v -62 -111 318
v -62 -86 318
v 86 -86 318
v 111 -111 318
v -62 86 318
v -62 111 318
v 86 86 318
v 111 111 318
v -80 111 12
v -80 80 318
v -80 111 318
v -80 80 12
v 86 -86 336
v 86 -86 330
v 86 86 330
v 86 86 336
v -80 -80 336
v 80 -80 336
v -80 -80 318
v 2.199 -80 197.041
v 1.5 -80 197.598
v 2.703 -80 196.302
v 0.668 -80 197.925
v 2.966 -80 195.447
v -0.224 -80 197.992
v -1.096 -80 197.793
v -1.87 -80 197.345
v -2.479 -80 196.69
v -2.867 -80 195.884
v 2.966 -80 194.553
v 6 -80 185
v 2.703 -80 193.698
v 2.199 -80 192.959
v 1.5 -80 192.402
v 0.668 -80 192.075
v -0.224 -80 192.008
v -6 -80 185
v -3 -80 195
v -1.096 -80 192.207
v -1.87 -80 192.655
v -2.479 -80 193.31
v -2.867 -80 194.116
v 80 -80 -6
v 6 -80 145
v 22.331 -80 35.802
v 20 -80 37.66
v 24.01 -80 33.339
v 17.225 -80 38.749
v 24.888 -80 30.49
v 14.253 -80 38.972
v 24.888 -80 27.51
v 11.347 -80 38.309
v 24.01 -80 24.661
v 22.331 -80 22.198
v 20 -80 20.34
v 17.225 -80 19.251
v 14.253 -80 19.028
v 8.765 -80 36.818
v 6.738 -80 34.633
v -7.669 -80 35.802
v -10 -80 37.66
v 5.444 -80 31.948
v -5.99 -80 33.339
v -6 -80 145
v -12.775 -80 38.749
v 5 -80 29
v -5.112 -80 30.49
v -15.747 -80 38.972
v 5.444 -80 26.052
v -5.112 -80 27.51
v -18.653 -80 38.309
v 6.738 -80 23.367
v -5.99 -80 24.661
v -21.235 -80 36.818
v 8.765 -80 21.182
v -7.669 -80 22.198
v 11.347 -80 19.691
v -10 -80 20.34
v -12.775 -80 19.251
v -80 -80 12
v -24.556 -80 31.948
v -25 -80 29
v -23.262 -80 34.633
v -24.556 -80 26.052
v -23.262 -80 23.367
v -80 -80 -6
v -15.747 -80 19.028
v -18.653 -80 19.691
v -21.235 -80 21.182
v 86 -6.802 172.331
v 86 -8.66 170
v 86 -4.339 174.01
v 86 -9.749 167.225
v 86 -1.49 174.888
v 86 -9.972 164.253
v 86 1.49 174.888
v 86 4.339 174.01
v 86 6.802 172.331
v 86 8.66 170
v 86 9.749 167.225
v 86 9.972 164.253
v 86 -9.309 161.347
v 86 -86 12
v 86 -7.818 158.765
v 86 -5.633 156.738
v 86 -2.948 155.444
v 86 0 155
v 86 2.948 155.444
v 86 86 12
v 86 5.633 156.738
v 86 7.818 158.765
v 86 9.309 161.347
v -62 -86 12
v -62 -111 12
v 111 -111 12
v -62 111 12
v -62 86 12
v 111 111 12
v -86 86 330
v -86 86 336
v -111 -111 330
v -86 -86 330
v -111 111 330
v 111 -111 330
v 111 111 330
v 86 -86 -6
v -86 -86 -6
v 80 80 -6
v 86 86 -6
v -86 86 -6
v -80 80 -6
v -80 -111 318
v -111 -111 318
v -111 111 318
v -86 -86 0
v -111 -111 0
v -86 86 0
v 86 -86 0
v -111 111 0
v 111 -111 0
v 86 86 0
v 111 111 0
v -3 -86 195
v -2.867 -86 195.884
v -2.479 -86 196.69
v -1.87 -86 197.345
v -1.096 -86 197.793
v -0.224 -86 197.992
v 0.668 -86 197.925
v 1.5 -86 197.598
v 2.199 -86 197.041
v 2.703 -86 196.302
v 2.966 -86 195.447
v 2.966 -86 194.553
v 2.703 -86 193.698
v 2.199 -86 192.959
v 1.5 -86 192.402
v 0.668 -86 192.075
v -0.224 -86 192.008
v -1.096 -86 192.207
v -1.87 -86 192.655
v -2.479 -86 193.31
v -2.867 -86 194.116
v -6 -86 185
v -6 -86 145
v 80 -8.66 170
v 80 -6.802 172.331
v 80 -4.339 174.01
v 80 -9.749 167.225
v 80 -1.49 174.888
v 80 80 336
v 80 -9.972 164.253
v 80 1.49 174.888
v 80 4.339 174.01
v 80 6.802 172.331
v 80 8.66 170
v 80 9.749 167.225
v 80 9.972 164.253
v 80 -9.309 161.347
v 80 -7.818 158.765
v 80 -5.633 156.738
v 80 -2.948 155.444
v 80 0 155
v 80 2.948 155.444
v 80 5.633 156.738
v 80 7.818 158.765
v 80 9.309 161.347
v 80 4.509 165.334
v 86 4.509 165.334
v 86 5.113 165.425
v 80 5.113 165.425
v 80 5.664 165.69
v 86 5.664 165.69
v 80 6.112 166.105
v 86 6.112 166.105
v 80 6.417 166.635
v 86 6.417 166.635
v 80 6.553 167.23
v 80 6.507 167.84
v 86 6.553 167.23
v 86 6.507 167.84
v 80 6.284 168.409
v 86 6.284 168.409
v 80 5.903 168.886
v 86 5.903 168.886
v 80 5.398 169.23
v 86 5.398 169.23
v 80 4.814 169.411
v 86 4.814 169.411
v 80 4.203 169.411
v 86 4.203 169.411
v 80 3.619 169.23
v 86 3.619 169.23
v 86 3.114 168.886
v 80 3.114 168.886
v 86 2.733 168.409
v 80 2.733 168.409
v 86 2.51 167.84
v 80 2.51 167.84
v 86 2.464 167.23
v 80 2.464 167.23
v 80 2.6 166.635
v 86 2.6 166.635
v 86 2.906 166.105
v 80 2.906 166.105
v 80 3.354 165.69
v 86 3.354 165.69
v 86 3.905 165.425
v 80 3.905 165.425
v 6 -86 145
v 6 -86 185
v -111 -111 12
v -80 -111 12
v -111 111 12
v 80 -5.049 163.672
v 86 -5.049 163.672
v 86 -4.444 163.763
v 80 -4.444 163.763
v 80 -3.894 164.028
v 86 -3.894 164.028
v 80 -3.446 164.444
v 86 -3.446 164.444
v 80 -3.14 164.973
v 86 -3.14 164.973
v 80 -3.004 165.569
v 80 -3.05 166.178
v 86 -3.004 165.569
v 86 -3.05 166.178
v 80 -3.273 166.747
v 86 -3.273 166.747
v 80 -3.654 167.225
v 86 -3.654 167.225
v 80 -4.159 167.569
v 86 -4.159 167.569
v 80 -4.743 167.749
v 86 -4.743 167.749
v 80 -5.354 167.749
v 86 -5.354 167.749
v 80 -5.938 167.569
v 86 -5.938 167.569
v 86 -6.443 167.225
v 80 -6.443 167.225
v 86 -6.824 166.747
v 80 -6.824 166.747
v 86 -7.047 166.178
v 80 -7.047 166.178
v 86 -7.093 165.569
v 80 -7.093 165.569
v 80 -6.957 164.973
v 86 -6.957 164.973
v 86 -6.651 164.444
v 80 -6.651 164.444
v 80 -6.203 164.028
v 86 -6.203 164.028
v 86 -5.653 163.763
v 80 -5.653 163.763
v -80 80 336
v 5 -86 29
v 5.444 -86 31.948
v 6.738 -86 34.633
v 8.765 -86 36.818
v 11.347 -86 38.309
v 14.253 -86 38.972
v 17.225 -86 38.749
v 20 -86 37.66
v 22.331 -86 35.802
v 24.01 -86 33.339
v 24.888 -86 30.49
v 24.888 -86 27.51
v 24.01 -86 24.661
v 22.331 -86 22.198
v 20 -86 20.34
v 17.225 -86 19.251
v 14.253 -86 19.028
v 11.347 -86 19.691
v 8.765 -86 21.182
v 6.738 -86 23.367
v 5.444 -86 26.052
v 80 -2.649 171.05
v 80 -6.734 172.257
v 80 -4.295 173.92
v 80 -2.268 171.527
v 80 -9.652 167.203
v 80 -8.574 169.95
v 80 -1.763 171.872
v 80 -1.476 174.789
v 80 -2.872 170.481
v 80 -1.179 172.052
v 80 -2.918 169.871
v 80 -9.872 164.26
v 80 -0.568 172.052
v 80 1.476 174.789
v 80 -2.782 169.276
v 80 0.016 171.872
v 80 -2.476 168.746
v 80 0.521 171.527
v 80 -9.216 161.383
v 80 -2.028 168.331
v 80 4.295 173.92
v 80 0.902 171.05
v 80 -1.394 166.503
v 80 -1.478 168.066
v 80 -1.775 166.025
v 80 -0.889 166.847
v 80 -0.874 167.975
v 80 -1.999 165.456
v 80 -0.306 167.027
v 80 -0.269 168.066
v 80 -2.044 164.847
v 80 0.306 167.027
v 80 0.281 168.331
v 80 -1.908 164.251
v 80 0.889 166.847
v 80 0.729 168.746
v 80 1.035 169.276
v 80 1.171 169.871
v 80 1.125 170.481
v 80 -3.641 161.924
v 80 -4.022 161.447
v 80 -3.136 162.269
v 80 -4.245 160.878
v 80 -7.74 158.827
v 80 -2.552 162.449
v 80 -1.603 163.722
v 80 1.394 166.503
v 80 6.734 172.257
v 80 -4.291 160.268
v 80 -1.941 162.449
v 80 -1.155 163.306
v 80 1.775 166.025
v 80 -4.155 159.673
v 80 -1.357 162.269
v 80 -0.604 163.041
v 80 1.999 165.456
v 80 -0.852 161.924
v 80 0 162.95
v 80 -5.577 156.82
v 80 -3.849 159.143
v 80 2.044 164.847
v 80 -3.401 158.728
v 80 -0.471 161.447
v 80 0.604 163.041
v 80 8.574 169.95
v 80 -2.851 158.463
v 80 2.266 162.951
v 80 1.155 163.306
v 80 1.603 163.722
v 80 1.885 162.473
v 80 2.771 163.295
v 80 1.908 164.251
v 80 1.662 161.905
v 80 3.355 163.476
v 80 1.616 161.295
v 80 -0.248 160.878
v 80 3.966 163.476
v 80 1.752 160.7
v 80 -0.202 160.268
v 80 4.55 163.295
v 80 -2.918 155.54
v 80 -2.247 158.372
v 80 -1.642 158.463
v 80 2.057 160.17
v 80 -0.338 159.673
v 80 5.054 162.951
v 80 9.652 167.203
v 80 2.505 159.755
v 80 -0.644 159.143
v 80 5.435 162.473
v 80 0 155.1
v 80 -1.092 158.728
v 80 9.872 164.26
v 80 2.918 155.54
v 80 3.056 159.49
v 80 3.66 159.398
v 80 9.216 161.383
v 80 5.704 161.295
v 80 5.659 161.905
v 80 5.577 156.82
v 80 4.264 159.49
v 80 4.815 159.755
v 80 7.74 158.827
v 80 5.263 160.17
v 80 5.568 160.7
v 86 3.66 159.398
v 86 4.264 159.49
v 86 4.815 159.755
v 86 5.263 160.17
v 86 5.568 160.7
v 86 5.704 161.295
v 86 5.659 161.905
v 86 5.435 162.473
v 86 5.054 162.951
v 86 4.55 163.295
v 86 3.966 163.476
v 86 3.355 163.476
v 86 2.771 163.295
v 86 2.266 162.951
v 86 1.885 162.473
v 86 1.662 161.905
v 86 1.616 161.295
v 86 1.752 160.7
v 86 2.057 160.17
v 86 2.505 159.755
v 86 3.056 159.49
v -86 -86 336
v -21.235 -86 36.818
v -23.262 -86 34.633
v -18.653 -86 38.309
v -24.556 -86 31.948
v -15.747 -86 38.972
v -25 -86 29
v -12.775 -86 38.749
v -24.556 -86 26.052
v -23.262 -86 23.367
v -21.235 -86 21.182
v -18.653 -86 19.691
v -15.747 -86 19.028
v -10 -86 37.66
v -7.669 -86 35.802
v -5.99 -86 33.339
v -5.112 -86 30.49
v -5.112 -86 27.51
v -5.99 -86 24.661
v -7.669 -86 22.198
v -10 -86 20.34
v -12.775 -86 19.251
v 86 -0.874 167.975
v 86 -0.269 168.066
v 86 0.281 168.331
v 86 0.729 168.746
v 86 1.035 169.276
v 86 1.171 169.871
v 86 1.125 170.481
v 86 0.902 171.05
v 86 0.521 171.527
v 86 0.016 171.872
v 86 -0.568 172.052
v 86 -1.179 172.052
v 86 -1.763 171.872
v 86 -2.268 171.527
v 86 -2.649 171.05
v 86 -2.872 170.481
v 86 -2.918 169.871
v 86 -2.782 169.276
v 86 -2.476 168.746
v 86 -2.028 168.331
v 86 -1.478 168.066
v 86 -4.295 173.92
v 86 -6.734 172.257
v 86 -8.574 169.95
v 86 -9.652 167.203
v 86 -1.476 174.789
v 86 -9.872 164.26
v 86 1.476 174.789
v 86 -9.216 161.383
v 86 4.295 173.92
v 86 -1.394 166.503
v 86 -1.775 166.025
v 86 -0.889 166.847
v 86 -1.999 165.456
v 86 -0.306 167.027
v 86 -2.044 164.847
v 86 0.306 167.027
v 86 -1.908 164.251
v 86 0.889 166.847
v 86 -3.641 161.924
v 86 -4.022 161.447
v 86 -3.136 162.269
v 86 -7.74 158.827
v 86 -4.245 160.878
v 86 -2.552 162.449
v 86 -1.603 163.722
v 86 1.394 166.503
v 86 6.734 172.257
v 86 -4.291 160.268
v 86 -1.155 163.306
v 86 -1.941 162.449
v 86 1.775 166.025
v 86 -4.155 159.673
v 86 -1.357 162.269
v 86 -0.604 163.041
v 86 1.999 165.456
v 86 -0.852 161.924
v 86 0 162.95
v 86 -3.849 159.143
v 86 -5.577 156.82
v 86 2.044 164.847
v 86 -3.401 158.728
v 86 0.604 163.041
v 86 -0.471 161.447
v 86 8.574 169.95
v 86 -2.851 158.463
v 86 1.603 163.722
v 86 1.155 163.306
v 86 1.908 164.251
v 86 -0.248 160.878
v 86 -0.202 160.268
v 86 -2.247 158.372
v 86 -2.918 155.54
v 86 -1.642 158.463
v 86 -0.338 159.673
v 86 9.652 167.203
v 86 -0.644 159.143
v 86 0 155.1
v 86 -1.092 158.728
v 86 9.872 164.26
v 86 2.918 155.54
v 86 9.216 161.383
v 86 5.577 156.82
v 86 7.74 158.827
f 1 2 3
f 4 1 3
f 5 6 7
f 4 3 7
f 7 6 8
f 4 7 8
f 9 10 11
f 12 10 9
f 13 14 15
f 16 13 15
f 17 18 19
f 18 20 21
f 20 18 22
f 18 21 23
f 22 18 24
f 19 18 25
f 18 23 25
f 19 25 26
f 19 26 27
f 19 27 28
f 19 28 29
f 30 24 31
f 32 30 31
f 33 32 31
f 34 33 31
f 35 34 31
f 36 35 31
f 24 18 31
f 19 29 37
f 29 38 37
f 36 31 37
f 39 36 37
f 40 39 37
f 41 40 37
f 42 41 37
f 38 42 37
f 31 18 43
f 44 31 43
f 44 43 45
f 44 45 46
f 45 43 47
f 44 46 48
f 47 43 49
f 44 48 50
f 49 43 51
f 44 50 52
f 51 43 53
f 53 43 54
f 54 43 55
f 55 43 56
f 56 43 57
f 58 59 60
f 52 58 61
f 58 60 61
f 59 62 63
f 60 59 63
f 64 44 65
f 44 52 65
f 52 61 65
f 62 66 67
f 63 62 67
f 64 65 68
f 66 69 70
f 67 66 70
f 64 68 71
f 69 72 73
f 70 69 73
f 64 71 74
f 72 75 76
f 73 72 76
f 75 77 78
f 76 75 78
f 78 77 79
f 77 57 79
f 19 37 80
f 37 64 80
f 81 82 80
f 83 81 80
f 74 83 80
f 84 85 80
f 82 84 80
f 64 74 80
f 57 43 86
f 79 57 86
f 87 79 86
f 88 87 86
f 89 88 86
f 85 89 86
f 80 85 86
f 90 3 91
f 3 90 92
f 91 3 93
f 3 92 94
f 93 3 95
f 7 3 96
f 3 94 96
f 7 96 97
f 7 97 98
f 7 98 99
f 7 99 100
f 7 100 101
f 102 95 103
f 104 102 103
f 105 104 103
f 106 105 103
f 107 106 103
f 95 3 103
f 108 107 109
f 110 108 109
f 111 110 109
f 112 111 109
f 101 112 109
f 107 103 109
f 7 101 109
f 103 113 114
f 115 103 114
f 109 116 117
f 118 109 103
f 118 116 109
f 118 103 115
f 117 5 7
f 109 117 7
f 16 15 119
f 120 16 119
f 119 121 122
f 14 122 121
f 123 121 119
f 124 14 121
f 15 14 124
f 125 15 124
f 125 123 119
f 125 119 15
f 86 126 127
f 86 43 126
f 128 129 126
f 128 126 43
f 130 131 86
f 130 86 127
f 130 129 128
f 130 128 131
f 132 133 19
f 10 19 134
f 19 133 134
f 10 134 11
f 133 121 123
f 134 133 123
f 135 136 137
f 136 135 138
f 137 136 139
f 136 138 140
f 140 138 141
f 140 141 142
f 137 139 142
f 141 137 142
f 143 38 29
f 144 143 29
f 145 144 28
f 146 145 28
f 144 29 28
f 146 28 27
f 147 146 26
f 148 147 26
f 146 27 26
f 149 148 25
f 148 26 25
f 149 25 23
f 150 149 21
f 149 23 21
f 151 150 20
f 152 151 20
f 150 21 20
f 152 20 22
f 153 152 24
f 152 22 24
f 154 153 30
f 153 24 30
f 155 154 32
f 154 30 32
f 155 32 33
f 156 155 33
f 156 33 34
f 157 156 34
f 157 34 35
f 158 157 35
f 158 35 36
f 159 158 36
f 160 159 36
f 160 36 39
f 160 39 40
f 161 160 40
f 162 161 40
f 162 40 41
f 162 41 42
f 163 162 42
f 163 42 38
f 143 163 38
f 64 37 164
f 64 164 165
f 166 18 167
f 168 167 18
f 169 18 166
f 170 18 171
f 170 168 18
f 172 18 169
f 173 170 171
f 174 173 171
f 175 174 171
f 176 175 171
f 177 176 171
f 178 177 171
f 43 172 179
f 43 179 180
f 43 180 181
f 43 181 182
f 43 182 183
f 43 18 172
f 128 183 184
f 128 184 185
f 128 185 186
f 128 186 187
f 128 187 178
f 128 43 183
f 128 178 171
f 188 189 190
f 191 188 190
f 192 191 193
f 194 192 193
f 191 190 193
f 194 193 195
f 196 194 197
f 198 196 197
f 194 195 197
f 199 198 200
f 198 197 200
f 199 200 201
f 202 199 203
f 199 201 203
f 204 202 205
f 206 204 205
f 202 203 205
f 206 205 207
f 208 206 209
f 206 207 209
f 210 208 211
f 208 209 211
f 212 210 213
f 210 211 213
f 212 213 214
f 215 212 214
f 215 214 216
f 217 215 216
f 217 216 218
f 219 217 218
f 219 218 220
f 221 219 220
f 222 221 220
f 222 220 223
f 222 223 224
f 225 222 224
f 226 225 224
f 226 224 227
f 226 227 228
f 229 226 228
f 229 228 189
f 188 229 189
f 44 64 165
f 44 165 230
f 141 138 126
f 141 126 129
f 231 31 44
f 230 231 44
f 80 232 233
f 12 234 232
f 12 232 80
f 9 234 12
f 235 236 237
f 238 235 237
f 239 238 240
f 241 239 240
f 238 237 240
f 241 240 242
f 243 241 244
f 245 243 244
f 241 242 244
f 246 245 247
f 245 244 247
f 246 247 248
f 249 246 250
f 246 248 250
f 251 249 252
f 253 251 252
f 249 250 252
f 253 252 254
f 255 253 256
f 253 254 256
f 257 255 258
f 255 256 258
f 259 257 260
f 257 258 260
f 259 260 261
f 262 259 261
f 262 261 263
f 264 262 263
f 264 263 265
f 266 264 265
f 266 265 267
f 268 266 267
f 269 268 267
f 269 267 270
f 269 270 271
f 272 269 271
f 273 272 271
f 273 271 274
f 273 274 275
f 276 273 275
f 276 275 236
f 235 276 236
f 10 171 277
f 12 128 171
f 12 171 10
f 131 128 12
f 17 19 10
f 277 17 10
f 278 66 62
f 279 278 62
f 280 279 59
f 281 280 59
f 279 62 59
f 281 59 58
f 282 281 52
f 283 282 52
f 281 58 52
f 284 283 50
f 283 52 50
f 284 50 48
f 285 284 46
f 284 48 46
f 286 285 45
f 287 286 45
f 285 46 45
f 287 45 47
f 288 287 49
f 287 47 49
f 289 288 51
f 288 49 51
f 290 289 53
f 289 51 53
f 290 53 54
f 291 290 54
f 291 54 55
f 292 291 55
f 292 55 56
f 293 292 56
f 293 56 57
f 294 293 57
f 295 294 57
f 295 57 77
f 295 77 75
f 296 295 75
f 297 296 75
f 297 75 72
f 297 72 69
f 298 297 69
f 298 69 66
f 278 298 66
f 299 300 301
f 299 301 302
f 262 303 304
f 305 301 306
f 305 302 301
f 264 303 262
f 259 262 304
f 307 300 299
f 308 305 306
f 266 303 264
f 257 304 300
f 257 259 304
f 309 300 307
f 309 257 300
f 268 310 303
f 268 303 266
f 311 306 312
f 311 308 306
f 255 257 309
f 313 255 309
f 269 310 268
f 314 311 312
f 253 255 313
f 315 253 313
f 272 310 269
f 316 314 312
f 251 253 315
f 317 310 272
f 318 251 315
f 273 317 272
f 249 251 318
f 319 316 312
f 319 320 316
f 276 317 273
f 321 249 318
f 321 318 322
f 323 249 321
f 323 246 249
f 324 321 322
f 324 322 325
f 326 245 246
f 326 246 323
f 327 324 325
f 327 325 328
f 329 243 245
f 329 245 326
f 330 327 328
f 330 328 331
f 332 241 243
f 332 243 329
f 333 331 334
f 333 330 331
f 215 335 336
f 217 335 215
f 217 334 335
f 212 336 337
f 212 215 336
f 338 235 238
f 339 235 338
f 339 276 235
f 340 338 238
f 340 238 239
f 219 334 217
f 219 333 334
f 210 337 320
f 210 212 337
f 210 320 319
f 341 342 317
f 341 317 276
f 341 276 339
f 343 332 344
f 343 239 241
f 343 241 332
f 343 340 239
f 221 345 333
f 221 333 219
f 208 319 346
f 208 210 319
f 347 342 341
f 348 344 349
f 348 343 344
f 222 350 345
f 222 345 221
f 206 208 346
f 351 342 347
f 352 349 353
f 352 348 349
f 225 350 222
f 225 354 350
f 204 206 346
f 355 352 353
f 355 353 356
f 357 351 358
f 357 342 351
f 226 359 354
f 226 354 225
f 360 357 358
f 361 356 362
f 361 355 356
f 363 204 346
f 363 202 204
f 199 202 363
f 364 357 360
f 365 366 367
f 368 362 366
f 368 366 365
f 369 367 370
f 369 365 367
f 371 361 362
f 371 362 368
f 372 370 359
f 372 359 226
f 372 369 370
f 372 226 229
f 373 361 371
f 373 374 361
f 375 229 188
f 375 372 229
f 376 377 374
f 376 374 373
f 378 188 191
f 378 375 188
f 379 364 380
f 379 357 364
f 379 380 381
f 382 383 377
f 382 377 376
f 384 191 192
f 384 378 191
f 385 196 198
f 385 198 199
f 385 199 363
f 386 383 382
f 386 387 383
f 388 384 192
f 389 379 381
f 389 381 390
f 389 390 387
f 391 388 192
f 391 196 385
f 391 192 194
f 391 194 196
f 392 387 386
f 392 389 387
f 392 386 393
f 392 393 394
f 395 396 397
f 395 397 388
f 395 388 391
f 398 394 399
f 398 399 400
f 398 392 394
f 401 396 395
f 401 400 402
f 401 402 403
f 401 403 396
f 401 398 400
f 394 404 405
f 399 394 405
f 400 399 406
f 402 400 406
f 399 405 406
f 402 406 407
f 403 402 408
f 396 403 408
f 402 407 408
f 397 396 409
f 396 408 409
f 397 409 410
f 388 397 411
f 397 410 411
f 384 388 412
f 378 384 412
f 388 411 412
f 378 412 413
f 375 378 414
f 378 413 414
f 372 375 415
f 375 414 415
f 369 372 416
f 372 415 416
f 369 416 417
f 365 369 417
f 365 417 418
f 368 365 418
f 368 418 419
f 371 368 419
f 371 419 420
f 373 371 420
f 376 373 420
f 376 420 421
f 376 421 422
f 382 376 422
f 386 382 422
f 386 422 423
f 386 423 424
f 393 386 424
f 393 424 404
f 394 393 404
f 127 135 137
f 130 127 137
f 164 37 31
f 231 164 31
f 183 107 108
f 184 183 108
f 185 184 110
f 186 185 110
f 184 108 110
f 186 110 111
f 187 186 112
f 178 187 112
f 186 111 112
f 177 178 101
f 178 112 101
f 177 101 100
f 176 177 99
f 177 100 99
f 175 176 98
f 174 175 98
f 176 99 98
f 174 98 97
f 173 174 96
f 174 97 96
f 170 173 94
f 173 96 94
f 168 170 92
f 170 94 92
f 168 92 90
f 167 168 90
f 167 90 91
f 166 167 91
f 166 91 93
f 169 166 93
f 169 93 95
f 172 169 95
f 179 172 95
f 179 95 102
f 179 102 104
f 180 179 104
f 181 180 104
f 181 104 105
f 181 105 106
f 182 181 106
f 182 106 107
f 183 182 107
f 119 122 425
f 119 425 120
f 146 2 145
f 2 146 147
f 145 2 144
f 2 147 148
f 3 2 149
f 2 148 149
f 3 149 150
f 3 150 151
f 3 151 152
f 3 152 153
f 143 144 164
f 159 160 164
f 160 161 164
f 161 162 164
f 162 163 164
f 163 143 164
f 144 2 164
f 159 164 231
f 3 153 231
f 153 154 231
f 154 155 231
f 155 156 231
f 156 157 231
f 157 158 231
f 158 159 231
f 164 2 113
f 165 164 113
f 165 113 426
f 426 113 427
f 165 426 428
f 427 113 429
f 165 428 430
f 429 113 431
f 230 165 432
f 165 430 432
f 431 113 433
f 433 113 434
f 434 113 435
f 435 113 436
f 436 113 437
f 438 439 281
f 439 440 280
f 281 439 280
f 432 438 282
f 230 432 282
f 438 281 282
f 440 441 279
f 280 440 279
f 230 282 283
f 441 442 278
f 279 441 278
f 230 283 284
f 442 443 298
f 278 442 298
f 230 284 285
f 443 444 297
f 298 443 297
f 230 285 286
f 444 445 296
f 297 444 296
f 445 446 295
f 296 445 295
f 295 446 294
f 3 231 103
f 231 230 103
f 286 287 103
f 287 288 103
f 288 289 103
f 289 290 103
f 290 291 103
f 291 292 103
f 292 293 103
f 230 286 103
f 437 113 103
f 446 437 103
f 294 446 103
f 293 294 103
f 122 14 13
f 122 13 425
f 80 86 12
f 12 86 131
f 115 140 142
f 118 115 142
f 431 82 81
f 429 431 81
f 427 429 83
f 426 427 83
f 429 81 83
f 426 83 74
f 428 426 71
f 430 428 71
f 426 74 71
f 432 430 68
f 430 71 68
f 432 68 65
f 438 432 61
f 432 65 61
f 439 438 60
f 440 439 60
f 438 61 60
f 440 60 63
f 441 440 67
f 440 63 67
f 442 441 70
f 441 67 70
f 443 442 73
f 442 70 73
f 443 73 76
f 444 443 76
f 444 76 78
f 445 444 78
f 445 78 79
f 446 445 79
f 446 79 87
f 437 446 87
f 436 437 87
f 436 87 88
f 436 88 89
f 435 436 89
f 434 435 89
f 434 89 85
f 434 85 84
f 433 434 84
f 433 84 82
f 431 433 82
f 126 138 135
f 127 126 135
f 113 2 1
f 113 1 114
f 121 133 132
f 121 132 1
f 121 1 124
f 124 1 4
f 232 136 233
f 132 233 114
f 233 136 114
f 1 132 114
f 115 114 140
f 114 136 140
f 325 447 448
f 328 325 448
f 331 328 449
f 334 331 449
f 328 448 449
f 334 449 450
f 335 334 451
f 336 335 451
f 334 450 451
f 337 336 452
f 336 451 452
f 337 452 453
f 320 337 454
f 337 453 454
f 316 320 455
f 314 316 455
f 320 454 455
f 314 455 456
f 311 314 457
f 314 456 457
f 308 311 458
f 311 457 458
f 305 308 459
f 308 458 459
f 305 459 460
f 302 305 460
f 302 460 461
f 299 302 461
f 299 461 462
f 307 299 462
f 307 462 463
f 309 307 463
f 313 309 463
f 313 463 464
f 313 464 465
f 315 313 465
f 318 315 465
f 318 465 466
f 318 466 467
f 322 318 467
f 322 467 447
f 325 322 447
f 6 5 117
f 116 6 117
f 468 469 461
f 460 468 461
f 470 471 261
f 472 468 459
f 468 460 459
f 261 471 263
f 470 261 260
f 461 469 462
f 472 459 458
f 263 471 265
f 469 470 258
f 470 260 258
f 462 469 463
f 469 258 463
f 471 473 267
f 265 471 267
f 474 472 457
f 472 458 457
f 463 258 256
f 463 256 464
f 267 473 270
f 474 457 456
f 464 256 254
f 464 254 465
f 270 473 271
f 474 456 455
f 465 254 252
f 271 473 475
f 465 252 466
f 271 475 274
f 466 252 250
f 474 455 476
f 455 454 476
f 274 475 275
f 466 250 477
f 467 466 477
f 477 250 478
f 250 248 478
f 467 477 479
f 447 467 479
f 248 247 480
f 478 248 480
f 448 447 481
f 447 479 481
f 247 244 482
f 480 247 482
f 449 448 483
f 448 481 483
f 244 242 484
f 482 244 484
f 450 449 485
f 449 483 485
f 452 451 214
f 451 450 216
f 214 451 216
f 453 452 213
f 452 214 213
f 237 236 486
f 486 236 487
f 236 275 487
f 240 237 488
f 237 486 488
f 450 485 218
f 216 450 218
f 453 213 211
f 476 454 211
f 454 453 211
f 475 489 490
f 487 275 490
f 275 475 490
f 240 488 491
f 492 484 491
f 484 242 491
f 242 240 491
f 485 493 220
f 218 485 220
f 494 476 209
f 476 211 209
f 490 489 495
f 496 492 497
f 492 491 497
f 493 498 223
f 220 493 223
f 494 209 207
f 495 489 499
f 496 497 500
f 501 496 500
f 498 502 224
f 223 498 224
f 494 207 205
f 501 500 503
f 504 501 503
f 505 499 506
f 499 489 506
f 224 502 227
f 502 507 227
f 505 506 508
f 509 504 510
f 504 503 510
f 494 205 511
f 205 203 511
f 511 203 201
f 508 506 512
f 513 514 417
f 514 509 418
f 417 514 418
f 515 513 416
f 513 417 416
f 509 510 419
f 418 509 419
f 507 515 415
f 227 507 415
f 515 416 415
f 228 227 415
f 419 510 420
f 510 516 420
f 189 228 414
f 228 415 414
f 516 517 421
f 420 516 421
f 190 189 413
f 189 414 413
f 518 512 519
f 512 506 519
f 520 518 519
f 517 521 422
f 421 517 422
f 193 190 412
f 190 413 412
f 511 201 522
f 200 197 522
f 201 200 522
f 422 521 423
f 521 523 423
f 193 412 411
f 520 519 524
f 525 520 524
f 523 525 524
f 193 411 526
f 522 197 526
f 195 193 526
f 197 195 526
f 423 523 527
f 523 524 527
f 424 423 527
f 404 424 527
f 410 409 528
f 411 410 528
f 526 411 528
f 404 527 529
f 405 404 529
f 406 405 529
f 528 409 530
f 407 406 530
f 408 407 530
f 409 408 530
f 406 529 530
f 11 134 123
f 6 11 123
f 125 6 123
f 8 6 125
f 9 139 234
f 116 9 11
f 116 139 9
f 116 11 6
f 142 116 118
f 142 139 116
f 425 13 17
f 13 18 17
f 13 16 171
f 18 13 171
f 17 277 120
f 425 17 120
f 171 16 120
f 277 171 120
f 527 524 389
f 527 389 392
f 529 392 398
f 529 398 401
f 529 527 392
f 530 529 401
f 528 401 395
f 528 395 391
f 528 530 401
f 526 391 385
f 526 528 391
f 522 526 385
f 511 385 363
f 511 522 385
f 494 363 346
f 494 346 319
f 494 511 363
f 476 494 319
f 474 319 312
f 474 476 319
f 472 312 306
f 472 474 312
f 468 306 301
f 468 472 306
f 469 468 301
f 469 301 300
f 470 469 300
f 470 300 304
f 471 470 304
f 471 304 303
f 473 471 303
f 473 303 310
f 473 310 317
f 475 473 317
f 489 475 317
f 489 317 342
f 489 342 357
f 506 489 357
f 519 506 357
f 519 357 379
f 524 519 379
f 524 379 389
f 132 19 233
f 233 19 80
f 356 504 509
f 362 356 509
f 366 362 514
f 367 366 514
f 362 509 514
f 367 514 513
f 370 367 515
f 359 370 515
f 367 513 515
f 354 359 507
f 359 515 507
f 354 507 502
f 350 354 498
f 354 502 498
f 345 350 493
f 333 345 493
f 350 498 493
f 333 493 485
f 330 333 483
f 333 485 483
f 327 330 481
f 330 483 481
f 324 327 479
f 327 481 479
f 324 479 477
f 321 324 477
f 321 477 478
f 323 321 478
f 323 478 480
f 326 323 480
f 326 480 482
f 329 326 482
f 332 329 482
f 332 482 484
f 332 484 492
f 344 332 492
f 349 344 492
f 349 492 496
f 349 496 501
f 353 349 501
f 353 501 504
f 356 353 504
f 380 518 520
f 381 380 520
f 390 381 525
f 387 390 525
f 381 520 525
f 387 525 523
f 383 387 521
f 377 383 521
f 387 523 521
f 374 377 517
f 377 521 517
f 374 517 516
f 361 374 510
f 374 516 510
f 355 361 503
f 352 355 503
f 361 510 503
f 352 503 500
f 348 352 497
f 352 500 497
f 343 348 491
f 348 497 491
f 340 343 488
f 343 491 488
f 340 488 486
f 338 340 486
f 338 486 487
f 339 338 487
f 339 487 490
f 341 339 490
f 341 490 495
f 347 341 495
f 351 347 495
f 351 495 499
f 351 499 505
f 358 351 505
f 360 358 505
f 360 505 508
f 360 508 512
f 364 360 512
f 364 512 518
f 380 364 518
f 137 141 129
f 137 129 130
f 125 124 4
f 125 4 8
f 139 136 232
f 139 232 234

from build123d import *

# Parameters (mm, degrees)
SKETCH1_W           = 172
SKETCH1_H           = 172
SKETCH1_W_2         = 160
SKETCH1_H_2         = 160
EXTRUDE_THIN1_DEPTH = 330
SKETCH5_W           = 222
SKETCH5_H           = 222
SKETCH5_W_2         = 160
SKETCH5_H_2         = 160
BOSS_EXTRUDE2_DEPTH = 12
SKETCH6_W           = 172
SKETCH6_H           = 172
SKETCH6_W_2         = 160
SKETCH6_H_2         = 160
EXTRUDE_THIN2_DEPTH = 6
SKETCH7_W           = 6
SKETCH7_H           = 306
CUT_EXTRUDE1_DEPTH  = 406.001234566
SKETCH8_W           = 18
SKETCH8_H           = 306
BOSS_EXTRUDE3_DEPTH = 25
SKETCH10_R          = 10
SKETCH10_R_2        = 9.9
SKETCH10_R_3        = 2.05
CUT_EXTRUDE2_DEPTH  = 406.001234566
SKETCH11_R          = 10
SKETCH11_R_2        = 3
SKETCH11_W          = 12
SKETCH11_H          = 40
CUT_EXTRUDE3_DEPTH  = 79


with BuildPart() as part:
    # Sketch1 → Extrude-Thin1 (new body)
    with BuildSketch(Plane.XY):
        Rectangle(SKETCH1_W, SKETCH1_H)
        Rectangle(SKETCH1_W_2, SKETCH1_H_2, mode=Mode.SUBTRACT)
    extrude(amount=EXTRUDE_THIN1_DEPTH)

    # Sketch5 → Boss-Extrude2 (add)
    with BuildSketch(Plane.XY.offset(330)):
        Rectangle(SKETCH5_W, SKETCH5_H)
        Rectangle(SKETCH5_W_2, SKETCH5_H_2, mode=Mode.SUBTRACT)
    boss_extrude2 = extrude(amount=-BOSS_EXTRUDE2_DEPTH)

    # Mirror2: Boss-Extrude2 across plane
    add(boss_extrude2.mirror(Plane.XY.offset(165)))

    # Sketch6 → Extrude-Thin2 (add)
    with BuildSketch(Plane(origin=(0, 0, 0), x_dir=(-1, 0, 0), z_dir=(0, 0, -1))):
        Rectangle(SKETCH6_W, SKETCH6_H)
        Rectangle(SKETCH6_W_2, SKETCH6_H_2, mode=Mode.SUBTRACT)
    extrude_thin2 = extrude(amount=EXTRUDE_THIN2_DEPTH)

    # Mirror3: Extrude-Thin2 across plane
    add(extrude_thin2.mirror(Plane.XY.offset(165)))

    # Sketch7 → Cut-Extrude1 (cut, through all)
    with BuildSketch(Plane(origin=(0, 86, 0), x_dir=(1, 0, 0), z_dir=(0, 1, 0))):
        with Locations((-83, -165)):
            Rectangle(SKETCH7_W, SKETCH7_H)
    extrude(amount=-CUT_EXTRUDE1_DEPTH, mode=Mode.SUBTRACT)

    # Sketch8 → Boss-Extrude3 (add)
    with BuildSketch(Plane(origin=(0, 86, 0), x_dir=(1, 0, 0), z_dir=(0, 1, 0))):
        with Locations((-71, -165)):
            Rectangle(SKETCH8_W, SKETCH8_H)
    boss_extrude3 = extrude(amount=BOSS_EXTRUDE3_DEPTH)

    # Mirror7: Boss-Extrude3 across plane
    add(boss_extrude3.mirror(Plane.ZX))

    # Sketch10 → Cut-Extrude2 (cut, through all)
    # profile 1 of 7: a face of its own
    with BuildSketch(Plane(origin=(86, 0, 0), x_dir=(0, 0, -1), z_dir=(1, 0, 0))):
        with Locations((-165, 0)):
            Circle(SKETCH10_R)
        with Locations((-165, 0)):
            Circle(SKETCH10_R_2, mode=Mode.SUBTRACT)
    # profile 2 of 7: a face of its own
    with BuildSketch(Plane(origin=(86, 0, 0), x_dir=(0, 0, -1), z_dir=(1, 0, 0))):
        with Locations((-160.421523837, -2.246676661)):
            Circle(SKETCH10_R_3)
    # profile 3 of 7: a face of its own
    with BuildSketch(Plane(origin=(86, 0, 0), x_dir=(0, 0, -1), z_dir=(1, 0, 0))):
        with Locations((-165.721889536, -5.048650859)):
            Circle(SKETCH10_R_3)
    # profile 4 of 7: a face of its own
    with BuildSketch(Plane(origin=(86, 0, 0), x_dir=(0, 0, -1), z_dir=(1, 0, 0))):
        with Locations((-170.024628433, -0.873561167)):
            Circle(SKETCH10_R_3)
    # profile 5 of 7: a face of its own
    with BuildSketch(Plane(origin=(86, 0, 0), x_dir=(0, 0, -1), z_dir=(1, 0, 0))):
        with Locations((-165, 0)):
            Circle(SKETCH10_R_3)
    # profile 6 of 7: a face of its own
    with BuildSketch(Plane(origin=(86, 0, 0), x_dir=(0, 0, -1), z_dir=(1, 0, 0))):
        with Locations((-161.448456578, 3.660128321)):
            Circle(SKETCH10_R_3)
    # profile 7 of 7: a face of its own
    with BuildSketch(Plane(origin=(86, 0, 0), x_dir=(0, 0, -1), z_dir=(1, 0, 0))):
        with Locations((-167.383501616, 4.508760367)):
            Circle(SKETCH10_R_3)
    extrude(amount=-CUT_EXTRUDE2_DEPTH, mode=Mode.SUBTRACT)


with BuildPart() as cut_extrude2_piece_1:
    # of the separate pieces the step leaves, piece 1, a body of its own (cut_extrude2_pieces)
    add(part.part.solids().sort_by_distance((111, -111, 0))[0])

    # Sketch11 → Cut-Extrude3 (cut)
    with BuildSketch(Plane(origin=(0, -80, 0), x_dir=(1, 0, 0), z_dir=(0, 1, 0))):
        with Locations(Location((-15, -29, 0), (0, 0, 180))):
            Circle(SKETCH11_R)
        with Locations(Location((0, -195, 0), (0, 0, 180))):
            Circle(SKETCH11_R_2)
        with Locations(Location((15, -29, 0), (0, 0, 180))):
            Circle(SKETCH11_R)
        with Locations((0, -165)):
            Rectangle(SKETCH11_W, SKETCH11_H)
    extrude(amount=-CUT_EXTRUDE3_DEPTH, mode=Mode.SUBTRACT)


with BuildPart() as cut_extrude2_piece_2:
    # of the separate pieces the step leaves, piece 2, a body of its own (cut_extrude2_pieces)
    add(part.part.solids().sort_by_distance((86, 0, 155.1))[0])


solid = Compound([cut_extrude2_piece_1.part, cut_extrude2_piece_2.part])
